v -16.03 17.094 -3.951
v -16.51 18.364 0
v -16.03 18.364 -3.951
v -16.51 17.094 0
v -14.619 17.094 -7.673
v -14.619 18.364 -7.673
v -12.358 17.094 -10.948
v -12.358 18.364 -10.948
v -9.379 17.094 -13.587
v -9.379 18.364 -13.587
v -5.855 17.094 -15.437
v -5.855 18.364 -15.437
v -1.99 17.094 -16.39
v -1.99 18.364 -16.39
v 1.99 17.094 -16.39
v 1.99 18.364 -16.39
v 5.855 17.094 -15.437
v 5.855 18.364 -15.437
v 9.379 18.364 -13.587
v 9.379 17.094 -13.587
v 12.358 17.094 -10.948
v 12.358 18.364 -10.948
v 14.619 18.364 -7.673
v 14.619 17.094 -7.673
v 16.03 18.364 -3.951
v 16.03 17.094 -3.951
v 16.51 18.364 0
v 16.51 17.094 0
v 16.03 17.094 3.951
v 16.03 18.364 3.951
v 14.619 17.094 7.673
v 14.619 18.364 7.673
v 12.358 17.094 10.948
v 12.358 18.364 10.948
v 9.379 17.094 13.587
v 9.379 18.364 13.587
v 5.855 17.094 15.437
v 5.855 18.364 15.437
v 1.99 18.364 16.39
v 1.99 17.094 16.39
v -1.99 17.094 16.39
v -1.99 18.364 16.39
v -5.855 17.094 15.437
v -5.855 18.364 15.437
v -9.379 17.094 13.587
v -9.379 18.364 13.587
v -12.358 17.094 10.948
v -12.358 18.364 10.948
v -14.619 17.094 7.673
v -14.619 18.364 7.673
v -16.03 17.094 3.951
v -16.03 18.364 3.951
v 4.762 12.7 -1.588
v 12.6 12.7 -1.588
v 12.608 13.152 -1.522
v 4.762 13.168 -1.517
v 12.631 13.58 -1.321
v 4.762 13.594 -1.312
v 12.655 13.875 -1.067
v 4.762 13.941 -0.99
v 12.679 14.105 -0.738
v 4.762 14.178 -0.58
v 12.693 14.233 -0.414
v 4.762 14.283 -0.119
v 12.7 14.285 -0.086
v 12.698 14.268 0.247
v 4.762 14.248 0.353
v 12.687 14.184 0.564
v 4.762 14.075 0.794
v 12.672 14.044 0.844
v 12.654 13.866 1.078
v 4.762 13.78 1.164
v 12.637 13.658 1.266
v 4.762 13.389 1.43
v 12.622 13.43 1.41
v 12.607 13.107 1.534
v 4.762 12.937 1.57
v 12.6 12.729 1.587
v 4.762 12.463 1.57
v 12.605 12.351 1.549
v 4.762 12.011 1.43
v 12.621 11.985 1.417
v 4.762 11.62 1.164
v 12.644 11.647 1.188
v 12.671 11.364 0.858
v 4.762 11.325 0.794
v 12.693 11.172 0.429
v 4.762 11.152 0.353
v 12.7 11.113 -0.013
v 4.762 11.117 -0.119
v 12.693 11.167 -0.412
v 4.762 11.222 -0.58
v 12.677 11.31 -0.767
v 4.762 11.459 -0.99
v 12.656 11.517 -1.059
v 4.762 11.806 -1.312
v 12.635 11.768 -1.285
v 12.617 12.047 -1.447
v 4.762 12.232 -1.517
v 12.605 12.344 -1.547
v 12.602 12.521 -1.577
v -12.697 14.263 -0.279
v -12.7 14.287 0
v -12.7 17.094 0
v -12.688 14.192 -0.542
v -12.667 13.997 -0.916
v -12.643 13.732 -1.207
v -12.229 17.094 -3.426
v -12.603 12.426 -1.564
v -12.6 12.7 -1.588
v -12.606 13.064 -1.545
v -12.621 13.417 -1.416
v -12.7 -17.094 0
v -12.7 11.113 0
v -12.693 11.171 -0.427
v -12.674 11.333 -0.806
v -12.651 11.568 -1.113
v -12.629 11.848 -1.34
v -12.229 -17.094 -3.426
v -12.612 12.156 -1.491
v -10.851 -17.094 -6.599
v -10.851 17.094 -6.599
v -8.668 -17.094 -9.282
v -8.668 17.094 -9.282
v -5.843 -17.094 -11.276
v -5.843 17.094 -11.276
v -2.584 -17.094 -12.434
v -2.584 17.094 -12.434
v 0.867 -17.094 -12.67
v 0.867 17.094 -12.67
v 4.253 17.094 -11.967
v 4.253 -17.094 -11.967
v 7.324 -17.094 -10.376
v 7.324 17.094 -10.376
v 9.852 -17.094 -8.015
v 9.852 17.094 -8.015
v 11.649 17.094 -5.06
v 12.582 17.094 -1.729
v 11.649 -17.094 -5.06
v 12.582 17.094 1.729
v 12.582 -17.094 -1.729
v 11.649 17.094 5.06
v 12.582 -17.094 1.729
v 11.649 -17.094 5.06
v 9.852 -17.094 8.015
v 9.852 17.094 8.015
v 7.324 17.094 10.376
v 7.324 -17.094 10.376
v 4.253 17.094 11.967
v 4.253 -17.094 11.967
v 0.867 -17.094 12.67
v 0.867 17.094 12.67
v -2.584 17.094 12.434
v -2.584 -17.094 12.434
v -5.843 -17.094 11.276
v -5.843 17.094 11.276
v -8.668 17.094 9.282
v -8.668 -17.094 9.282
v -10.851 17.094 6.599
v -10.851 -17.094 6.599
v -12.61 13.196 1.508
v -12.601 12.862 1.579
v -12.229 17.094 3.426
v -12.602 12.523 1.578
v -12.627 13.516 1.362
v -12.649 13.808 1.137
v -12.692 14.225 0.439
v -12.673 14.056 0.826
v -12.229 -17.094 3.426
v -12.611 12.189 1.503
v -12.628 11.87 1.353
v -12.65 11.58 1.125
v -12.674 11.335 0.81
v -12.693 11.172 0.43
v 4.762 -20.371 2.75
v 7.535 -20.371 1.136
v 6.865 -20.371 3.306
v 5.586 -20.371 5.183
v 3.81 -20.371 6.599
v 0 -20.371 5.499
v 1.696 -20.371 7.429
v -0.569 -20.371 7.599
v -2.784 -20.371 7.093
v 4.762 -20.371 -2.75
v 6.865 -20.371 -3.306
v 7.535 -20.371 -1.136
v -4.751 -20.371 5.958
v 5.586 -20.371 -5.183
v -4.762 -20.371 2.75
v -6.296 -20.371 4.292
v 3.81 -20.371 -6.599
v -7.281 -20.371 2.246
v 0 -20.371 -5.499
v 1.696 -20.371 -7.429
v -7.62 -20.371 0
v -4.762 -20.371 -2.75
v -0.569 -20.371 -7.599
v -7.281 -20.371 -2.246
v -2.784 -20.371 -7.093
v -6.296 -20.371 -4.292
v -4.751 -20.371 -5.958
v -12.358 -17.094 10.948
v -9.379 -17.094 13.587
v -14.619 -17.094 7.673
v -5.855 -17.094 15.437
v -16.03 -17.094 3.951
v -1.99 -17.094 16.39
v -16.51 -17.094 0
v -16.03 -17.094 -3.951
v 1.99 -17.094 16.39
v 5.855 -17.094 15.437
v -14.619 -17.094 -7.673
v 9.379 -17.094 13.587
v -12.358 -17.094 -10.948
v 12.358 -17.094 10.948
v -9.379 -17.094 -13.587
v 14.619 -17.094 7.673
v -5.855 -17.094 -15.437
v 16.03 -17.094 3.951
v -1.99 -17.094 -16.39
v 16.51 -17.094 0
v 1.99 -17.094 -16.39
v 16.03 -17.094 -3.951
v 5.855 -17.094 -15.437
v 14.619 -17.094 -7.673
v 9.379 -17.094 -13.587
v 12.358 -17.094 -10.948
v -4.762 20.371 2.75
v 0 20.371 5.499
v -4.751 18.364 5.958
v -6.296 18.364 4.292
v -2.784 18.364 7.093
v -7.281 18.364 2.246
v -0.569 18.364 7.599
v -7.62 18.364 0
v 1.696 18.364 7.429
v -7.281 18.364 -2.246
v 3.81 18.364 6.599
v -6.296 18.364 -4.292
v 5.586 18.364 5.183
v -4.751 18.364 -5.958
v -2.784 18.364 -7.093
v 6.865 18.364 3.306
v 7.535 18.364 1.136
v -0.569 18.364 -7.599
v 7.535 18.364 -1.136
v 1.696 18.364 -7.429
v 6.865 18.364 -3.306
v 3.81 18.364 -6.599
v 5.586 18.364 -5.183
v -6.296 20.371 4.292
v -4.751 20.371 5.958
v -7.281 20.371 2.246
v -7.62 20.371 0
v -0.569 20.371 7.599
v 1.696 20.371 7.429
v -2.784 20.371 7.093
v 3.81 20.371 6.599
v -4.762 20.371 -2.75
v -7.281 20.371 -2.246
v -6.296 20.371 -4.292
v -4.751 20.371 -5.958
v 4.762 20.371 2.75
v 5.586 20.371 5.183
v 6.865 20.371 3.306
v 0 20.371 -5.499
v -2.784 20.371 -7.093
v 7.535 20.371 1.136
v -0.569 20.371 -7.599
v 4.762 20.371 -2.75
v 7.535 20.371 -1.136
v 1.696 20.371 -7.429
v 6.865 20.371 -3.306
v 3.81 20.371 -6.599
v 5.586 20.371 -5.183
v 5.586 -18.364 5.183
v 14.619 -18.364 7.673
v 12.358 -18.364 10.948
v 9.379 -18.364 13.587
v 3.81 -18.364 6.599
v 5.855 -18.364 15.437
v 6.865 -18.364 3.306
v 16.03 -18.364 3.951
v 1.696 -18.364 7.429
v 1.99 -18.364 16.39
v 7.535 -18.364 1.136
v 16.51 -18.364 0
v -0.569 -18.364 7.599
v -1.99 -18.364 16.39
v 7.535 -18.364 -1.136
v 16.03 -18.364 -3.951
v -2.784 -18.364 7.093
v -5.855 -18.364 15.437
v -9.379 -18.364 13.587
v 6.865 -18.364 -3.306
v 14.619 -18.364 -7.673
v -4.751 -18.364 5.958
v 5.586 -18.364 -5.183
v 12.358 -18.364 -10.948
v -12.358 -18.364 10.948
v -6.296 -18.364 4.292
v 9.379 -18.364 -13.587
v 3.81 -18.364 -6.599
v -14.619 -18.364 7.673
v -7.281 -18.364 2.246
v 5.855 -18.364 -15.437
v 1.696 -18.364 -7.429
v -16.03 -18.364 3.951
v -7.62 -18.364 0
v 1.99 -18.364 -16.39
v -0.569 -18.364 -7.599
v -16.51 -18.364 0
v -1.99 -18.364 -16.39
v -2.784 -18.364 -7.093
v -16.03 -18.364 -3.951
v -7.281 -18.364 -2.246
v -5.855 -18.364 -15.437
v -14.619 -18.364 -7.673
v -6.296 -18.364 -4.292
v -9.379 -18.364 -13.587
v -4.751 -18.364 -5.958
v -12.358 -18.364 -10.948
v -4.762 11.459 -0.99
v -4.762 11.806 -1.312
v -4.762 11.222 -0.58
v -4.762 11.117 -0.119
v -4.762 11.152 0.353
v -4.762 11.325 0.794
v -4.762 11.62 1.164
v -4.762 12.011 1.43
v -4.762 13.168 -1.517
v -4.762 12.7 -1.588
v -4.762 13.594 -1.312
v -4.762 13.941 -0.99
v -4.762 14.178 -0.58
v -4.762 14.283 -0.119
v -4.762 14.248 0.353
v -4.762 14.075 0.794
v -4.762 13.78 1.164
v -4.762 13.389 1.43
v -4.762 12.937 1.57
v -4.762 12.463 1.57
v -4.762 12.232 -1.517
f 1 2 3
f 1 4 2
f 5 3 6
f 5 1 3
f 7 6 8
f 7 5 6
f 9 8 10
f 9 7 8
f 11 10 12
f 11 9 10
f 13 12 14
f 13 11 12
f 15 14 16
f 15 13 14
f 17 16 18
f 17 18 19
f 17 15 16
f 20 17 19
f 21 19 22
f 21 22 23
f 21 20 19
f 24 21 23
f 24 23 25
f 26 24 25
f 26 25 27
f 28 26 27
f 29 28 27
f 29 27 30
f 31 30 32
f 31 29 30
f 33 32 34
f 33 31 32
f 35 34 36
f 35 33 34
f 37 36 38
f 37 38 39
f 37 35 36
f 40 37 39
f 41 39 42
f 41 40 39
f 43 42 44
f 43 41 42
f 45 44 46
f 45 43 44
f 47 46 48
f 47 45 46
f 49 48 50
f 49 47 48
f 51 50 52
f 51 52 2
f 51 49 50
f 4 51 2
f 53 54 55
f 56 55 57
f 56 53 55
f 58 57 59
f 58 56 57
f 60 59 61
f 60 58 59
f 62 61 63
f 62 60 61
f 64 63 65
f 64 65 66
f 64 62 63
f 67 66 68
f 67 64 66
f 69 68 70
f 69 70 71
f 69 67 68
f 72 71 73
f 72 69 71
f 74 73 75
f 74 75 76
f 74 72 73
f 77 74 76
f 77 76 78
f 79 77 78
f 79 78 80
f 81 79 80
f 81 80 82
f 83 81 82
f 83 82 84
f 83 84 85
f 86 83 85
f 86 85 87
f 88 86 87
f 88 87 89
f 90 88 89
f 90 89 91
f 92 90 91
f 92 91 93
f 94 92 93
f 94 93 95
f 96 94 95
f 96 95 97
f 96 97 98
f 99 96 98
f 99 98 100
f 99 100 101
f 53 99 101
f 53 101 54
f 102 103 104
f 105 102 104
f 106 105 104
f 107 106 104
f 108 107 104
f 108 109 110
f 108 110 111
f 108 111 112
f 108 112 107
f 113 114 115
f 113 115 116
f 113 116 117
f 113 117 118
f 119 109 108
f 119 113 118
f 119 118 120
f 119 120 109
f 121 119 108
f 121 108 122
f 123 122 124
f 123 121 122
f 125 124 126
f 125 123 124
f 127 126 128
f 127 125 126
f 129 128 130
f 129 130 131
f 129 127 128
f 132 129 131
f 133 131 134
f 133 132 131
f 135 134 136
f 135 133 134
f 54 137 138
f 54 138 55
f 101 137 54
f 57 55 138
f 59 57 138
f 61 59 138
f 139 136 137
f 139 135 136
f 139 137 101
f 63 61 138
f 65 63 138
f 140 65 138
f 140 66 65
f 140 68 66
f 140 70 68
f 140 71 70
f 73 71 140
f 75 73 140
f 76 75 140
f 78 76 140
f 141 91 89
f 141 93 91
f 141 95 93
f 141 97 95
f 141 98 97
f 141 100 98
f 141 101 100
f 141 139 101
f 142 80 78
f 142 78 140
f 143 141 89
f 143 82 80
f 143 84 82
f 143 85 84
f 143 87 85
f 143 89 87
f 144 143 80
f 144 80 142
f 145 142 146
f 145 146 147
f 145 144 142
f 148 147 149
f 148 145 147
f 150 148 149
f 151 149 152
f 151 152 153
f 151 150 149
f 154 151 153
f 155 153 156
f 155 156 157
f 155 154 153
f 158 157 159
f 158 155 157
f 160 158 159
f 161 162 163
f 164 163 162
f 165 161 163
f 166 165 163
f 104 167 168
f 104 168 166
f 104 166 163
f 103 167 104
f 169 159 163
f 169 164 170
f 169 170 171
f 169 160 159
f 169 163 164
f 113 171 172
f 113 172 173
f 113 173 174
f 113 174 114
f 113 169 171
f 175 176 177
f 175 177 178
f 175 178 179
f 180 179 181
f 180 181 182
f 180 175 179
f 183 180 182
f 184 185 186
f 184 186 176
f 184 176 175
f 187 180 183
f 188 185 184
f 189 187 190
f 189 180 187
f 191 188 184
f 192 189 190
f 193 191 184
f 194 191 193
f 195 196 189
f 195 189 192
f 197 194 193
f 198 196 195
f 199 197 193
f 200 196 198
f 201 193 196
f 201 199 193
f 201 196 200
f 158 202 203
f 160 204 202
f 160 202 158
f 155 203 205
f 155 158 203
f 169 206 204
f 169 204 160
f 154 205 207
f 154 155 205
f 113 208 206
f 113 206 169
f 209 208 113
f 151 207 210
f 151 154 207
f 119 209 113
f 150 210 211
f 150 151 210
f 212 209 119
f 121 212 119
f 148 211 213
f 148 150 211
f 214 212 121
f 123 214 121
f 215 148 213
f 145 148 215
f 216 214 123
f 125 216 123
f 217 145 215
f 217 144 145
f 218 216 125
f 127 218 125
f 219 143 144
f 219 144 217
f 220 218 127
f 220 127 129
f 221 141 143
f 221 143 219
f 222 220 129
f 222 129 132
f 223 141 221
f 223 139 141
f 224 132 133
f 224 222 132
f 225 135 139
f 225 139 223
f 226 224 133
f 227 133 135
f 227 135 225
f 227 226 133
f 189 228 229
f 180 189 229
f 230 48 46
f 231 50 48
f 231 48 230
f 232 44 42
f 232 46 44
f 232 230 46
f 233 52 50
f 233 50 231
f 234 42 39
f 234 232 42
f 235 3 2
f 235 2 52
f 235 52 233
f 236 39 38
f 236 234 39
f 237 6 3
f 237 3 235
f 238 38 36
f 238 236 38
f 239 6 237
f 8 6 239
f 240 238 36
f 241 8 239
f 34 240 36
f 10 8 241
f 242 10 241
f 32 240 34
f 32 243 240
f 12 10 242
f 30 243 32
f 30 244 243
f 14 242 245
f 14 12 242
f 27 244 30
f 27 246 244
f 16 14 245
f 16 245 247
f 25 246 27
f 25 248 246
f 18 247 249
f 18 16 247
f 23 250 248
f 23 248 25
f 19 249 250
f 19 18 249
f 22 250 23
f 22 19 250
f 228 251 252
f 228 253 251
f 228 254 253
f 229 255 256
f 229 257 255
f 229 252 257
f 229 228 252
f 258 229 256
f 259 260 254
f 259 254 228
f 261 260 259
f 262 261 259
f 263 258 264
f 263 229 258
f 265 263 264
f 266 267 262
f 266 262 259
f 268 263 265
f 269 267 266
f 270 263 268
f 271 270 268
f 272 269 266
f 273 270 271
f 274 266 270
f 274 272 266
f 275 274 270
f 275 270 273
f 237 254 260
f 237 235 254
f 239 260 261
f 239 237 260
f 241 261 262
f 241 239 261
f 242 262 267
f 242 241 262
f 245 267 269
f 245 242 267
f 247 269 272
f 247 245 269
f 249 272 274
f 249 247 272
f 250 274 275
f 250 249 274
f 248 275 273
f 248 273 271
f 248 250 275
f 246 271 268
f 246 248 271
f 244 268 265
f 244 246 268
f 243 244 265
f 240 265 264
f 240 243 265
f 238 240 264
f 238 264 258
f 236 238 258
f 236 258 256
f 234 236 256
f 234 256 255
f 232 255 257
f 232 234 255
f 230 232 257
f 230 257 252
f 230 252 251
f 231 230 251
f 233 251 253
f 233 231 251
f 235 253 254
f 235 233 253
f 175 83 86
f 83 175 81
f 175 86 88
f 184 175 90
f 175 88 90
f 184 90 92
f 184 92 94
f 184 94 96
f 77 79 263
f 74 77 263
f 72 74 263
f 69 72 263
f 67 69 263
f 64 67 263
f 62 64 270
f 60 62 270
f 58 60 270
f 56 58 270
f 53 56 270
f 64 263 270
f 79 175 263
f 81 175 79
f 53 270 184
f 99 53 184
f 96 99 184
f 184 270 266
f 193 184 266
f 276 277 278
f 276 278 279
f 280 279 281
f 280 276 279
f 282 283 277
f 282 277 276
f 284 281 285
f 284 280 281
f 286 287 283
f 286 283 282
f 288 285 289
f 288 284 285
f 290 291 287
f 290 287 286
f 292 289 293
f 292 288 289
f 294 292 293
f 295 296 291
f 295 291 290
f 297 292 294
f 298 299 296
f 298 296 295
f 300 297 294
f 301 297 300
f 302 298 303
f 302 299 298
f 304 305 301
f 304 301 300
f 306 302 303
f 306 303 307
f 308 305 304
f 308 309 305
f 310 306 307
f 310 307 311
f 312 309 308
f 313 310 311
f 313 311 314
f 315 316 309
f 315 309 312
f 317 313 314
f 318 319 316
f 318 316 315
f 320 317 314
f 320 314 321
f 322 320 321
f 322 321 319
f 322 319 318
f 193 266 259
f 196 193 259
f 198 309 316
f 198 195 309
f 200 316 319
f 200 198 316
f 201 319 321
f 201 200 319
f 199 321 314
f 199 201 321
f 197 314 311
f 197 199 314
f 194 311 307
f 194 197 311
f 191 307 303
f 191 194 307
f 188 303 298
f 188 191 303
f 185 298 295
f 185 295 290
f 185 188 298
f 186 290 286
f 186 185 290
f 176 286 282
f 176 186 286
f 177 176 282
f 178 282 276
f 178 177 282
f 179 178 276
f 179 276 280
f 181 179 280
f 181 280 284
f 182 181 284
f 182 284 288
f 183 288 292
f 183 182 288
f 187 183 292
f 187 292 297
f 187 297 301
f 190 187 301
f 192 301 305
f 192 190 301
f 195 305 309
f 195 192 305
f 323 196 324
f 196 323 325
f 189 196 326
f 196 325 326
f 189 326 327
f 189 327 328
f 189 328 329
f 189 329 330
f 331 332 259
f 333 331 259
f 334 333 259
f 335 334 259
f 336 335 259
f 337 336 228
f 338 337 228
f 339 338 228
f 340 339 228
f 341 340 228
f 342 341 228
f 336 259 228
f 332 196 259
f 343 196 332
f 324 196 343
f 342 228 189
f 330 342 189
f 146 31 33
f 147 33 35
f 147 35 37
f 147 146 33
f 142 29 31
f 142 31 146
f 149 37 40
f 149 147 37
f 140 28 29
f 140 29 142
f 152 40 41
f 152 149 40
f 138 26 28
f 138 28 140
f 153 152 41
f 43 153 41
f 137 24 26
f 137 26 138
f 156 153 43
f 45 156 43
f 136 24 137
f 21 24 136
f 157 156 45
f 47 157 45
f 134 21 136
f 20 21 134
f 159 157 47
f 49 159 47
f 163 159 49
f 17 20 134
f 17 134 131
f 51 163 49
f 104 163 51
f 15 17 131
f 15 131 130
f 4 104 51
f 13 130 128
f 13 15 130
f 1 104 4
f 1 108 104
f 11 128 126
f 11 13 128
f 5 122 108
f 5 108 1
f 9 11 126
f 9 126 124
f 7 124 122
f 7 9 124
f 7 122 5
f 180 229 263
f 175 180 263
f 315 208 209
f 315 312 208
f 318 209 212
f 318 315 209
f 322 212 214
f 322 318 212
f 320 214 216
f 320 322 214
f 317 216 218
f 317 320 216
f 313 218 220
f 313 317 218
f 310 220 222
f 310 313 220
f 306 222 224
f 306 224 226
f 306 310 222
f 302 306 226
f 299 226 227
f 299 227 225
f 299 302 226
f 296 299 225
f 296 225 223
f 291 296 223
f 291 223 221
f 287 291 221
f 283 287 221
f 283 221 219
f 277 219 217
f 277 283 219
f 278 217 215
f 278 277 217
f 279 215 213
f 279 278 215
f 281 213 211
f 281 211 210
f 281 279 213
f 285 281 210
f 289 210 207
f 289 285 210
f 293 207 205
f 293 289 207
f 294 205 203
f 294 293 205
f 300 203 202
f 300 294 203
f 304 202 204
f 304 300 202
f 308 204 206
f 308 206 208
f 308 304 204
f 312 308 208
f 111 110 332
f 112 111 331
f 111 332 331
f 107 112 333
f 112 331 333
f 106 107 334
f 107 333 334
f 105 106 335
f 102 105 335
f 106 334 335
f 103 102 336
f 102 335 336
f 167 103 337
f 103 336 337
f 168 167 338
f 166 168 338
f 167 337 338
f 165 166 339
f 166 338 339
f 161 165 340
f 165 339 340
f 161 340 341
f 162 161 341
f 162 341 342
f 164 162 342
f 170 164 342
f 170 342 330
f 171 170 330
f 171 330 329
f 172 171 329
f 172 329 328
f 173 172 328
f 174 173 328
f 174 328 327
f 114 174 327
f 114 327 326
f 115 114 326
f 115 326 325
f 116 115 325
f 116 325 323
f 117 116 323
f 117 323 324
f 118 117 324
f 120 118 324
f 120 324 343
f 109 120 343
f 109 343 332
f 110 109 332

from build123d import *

# Parameters (mm, degrees)
CUT_EXTRUDE1_DEPTH      = 41.7416
SKETCH3_R               = 1.5875
CUT_EXTRUDE2_DEPTH      = 17.51
CUT_EXTRUDE2_DEPTH_BACK = 17.51


with BuildPart() as part:
    # Sketch1 → Revolve1 (revolve)
    with BuildSketch(Plane.XY):
        Polygon((-7.62, 18.3642), (-16.51, 18.3642), (-16.51, 17.0942), (-12.7, 17.0942), (-12.7, -17.0942), (-16.51, -17.0942), (-16.51, -18.3642), (-7.62, -18.3642), (-7.62, -20.3708), (0, -20.3708), (0, 20.3708), (-7.62, 20.3708), align=None)
    revolve(axis=Axis((0, 20.3708, 0), (0, -1, 0)))

    # Sketch2 → Cut-Extrude1 (cut, through all)
    with BuildSketch(Plane(origin=(0, 20.3708, 0), x_dir=(1, 0, 0), z_dir=(0, 1, 0))):
        Polygon((0, 5.499261314), (-4.7625, 2.749630657), (-4.7625, -2.749630657), (0, -5.499261314), (4.7625, -2.749630657), (4.7625, 2.749630657), align=None)
    extrude(amount=-CUT_EXTRUDE1_DEPTH, mode=Mode.SUBTRACT)

    # Sketch3 → Cut-Extrude2 (cut, two sides)
    with BuildSketch(Plane(origin=(0, 0, 0), x_dir=(0, 0, -1), z_dir=(1, 0, 0))) as cut_extrude2_sk:
        with Locations((0, 12.7)):
            Circle(SKETCH3_R)
    extrude(amount=CUT_EXTRUDE2_DEPTH, mode=Mode.SUBTRACT)
    extrude(cut_extrude2_sk.sketch, amount=-CUT_EXTRUDE2_DEPTH_BACK, mode=Mode.SUBTRACT)


solid = part.part
